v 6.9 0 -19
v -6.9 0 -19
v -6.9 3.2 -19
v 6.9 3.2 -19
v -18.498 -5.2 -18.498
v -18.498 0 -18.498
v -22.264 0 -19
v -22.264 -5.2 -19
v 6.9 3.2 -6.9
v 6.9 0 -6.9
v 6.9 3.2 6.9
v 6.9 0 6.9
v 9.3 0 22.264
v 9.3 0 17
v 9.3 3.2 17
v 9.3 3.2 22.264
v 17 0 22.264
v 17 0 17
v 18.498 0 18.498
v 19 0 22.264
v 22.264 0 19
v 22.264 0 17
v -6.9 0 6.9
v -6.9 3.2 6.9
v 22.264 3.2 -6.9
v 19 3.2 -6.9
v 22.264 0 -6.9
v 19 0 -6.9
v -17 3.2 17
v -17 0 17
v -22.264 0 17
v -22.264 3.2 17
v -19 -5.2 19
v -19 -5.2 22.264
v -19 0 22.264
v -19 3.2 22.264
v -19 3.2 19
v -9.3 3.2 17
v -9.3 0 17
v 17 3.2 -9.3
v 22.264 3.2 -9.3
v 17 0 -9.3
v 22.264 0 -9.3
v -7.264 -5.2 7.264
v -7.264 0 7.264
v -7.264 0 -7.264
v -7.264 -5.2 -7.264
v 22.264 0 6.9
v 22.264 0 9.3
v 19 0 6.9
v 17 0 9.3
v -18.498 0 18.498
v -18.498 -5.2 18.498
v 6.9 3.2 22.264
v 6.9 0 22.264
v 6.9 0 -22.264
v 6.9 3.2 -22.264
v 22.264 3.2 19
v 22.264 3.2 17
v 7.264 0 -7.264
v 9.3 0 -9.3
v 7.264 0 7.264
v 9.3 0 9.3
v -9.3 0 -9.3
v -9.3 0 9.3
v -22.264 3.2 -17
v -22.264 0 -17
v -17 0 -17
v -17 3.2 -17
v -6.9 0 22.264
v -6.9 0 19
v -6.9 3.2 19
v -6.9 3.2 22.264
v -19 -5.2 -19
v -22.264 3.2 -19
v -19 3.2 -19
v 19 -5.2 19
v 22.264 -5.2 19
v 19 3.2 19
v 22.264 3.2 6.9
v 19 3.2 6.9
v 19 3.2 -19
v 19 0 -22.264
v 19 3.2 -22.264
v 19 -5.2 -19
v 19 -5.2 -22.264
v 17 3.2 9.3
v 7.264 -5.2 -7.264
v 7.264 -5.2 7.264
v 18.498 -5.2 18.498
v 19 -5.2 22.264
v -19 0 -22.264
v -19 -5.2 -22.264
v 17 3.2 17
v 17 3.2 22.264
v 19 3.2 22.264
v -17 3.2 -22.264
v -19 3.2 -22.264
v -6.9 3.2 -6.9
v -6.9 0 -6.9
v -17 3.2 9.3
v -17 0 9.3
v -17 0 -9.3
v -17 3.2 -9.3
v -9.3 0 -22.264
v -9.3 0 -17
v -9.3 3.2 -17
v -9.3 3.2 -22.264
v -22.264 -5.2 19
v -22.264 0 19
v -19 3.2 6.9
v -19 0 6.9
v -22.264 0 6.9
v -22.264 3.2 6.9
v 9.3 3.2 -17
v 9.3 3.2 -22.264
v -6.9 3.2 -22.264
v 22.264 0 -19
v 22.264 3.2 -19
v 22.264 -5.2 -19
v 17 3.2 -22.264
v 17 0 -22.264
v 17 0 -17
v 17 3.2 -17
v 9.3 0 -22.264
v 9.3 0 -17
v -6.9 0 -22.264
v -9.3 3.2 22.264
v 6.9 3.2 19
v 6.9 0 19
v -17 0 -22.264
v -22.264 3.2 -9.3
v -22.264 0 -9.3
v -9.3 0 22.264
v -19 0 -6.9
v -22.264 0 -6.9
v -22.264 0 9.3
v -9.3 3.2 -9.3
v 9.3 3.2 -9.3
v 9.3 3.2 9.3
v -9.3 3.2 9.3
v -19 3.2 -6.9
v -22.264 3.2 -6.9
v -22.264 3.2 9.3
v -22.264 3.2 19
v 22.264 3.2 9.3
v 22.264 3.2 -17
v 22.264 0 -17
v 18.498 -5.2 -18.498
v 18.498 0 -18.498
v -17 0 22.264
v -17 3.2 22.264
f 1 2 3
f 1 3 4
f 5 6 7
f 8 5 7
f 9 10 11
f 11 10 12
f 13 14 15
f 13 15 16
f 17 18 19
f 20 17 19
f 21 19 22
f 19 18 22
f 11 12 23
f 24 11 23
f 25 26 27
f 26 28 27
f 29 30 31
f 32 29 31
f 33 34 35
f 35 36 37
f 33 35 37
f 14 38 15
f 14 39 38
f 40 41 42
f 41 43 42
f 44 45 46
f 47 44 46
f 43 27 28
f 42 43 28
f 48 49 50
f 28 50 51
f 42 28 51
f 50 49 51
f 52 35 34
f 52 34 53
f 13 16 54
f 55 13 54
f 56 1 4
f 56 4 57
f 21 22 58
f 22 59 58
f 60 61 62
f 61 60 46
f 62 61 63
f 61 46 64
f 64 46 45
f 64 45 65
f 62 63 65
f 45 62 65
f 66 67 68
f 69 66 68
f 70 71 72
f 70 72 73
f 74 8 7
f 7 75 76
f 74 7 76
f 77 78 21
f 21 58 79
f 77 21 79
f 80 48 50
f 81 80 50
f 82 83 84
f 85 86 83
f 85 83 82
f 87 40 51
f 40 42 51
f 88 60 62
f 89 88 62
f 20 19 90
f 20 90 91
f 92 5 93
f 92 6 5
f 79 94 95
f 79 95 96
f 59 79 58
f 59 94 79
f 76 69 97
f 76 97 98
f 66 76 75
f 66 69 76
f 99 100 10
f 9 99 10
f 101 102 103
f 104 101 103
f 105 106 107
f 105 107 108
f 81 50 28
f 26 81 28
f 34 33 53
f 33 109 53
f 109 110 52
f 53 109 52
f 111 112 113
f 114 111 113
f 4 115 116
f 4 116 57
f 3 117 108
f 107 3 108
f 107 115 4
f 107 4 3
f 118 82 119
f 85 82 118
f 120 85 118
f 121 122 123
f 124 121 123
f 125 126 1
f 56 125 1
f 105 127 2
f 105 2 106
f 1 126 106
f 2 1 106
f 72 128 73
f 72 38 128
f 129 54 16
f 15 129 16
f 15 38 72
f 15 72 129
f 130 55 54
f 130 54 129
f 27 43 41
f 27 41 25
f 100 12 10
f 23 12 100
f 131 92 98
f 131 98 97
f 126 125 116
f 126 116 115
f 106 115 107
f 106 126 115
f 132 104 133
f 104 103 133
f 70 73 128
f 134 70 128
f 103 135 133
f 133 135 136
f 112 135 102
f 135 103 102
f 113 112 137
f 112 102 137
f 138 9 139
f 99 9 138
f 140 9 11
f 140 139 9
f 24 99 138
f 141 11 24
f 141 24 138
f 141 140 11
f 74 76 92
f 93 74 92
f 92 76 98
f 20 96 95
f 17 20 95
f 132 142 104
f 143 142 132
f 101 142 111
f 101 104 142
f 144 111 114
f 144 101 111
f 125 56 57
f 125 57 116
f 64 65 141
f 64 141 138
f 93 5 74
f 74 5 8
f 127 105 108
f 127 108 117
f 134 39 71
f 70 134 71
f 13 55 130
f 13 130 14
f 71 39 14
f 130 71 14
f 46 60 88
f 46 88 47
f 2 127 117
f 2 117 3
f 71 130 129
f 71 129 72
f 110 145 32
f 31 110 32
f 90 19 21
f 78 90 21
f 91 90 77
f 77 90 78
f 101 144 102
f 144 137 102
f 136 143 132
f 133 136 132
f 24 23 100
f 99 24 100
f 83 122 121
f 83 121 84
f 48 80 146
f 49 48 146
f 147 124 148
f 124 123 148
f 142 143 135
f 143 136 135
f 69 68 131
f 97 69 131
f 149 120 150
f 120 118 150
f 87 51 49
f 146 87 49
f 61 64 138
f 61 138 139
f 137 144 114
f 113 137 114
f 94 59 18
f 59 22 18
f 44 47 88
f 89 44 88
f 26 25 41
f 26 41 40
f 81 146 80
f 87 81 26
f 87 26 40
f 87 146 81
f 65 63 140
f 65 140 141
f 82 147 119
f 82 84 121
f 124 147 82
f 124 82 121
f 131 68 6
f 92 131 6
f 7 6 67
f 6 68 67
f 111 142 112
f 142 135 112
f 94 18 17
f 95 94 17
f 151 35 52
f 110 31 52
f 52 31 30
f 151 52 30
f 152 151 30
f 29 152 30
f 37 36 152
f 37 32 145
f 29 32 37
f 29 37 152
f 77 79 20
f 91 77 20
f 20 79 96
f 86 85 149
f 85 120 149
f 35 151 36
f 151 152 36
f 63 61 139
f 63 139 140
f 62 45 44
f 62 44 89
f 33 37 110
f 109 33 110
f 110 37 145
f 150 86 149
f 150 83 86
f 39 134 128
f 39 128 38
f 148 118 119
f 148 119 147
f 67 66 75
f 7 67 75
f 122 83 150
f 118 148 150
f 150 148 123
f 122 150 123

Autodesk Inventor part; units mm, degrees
ref_plane "YZ Plane" through (0, 0, 0) normal (1, 0, 0) x (0, 1, 0)
ref_plane "XZ Plane" through (0, 0, 0) normal (0, 1, 0) x (-1, 0, 0)
ref_plane "XY Plane" through (0, 0, 0) normal (0, 0, 1) x (1, 0, 0)
sketch "スケッチ1" plane through (0, 0, 0) normal (0, 1, 0) x (-1, 0, 0)
  line L0 (0, -64.5) -> (0, 10.75) projected
  line L1 (-64.5, 0) -> (10.75, 0) projected
  line L2 (0, 0) -> (0, -22.264)
  line L3 (0, -22.264) -> (-19, -22.264)
  line L4 (-19, -22.264) -> (-19, -19)
  line L5 (-19, -19) -> (-22.264, -19)
  line L6 (-22.264, -19) -> (-22.264, 0)
  line L7 (-22.264, 0) -> (0, 0)
  line L8 (-17, -22.264) -> (-17, -17)
  line L9 (-17, -17) -> (-22.264, -17)
  line L10 (-9.3, -22.264) -> (-9.3, -17)
  line L11 (-9.3, -17) -> (0, -17)
  line L12 (0, -19) -> (-6.9, -19)
  line L13 (-6.9, -19) -> (-6.9, -22.264)
  line L14 (-22.264, -9.3) -> (-17, -9.3)
  line L15 (-17, -9.3) -> (-17, 0)
  line L16 (-19, 0) -> (-19, -6.9)
  line L17 (-19, -6.9) -> (-22.264, -6.9)
  line L18 (0, -6.9) -> (-6.9, -6.9)
  line L19 (-6.9, -6.9) -> (-6.9, 0)
  line L20 (0, -9.3) -> (-9.3, -9.3)
  line L21 (-9.3, -9.3) -> (-9.3, 0)
  dimension "d0" = 19
  dimension "d1" = 19
  dimension "d2" = 22.264
  dimension "d3" = 22.264
  dimension "d4" = 9.3
  dimension "d5" = 2.4
  dimension "d6" = 2
  dimension "d7" = 2
  dimension "d8" = 9.3
  dimension "d9" = 2.4
extrude "押し出し1" add sketch "スケッチ1" along normal blind 3.2 contours L12 L13 L3 L10 L11 L0 | L20 L21 L1 L19 L18 L0 | L3 L4 L5 L6 L9 L8 | L15 L14 L6 L17 L16 L1
extrude "押し出し2" add sketch "スケッチ1" against normal blind 5.2
sketch "スケッチ2" plane through (0, 0, 0) normal (0, 1, 0) x (-1, 0, 0)
  line L0 (0, -22.264) -> (-19, -22.264) projected
  line L1 (-17, -22.264) -> (-17, -17) projected
  line L2 (-22.264, -19) -> (-22.264, 0) projected
  line L3 (-17, -17) -> (-22.264, -17) projected
  line L4 (0, -64.5) -> (0, 10.75) projected
  line L5 (-64.5, 0) -> (10.75, 0) projected
  line L6 (-19, -22.264) -> (-17, -7.264)
  line L7 (-17, -7.264) -> (0, -7.264)
  line L8 (-22.264, -19) -> (-7.264, -17)
  line L9 (-7.264, -17) -> (-7.264, 0)
  line L10 (0, -22.264) -> (0, -7.264)
  line L11 (-7.264, 0) -> (-22.264, 0)
  point P0 (0, 0)
  dimension "d16" = 15
  dimension "d17" = 15
extrude "押し出し3" cut sketch "スケッチ2" against normal through all contours L0 L1 L8 L9 L7 L4 | L0 L6 L8 L1 | L8 L6 L3 L1 | L1 L3 L6 L7 L9 L8 | L7 L6 L3 L2 L5 L9 | L8 L2 L3 L6
mirror "ミラー1" about plane through (0, 0, 0) normal (1, 0, 0) of "押し出し1", "押し出し2", "押し出し3"
mirror "ミラー2" about plane through (0, 0, 0) normal (0, 0, 1) of "押し出し1", "押し出し2", "押し出し3", "ミラー1"
equation "\"d0\" = 0.5 * RailWidth"
equation "\"d1\" = 0.5 * RailWidth"
equation "\"d2\" = 0.5 * LengthB"
equation "\"d3\" = 0.5 * LengthA"
equation "\"d4\" = 0.5 * InsideWidth"
equation "\"d5\" = InnerWall"
equation "\"d6\" = OuterWall"
equation "\"d7\" = OuterWall"
equation "\"d8\" = 0.5 * InsideWidth"
equation "\"d9\" = InnerWall"
equation "\"d12\" = RailDepth"
equation "\"d14\" = RailHeight - RailDepth"
equation "\"LengthA\" = 0.207107 * StraightLength"
equation "\"LengthB\" = LengthA"
equation "\"RailWidth\" = 38"
equation "\"InsideWidth\" = 18.6"
equation "\"InnerWall\" = 2.4"
equation "\"OuterWall\" = 2"
equation "\"RailDepth\" = 3.2"
equation "\"RailHeight\" = 8.4"
equation "\"StraightLength\" = 215"
properties part number "CrossRail-DSS"
